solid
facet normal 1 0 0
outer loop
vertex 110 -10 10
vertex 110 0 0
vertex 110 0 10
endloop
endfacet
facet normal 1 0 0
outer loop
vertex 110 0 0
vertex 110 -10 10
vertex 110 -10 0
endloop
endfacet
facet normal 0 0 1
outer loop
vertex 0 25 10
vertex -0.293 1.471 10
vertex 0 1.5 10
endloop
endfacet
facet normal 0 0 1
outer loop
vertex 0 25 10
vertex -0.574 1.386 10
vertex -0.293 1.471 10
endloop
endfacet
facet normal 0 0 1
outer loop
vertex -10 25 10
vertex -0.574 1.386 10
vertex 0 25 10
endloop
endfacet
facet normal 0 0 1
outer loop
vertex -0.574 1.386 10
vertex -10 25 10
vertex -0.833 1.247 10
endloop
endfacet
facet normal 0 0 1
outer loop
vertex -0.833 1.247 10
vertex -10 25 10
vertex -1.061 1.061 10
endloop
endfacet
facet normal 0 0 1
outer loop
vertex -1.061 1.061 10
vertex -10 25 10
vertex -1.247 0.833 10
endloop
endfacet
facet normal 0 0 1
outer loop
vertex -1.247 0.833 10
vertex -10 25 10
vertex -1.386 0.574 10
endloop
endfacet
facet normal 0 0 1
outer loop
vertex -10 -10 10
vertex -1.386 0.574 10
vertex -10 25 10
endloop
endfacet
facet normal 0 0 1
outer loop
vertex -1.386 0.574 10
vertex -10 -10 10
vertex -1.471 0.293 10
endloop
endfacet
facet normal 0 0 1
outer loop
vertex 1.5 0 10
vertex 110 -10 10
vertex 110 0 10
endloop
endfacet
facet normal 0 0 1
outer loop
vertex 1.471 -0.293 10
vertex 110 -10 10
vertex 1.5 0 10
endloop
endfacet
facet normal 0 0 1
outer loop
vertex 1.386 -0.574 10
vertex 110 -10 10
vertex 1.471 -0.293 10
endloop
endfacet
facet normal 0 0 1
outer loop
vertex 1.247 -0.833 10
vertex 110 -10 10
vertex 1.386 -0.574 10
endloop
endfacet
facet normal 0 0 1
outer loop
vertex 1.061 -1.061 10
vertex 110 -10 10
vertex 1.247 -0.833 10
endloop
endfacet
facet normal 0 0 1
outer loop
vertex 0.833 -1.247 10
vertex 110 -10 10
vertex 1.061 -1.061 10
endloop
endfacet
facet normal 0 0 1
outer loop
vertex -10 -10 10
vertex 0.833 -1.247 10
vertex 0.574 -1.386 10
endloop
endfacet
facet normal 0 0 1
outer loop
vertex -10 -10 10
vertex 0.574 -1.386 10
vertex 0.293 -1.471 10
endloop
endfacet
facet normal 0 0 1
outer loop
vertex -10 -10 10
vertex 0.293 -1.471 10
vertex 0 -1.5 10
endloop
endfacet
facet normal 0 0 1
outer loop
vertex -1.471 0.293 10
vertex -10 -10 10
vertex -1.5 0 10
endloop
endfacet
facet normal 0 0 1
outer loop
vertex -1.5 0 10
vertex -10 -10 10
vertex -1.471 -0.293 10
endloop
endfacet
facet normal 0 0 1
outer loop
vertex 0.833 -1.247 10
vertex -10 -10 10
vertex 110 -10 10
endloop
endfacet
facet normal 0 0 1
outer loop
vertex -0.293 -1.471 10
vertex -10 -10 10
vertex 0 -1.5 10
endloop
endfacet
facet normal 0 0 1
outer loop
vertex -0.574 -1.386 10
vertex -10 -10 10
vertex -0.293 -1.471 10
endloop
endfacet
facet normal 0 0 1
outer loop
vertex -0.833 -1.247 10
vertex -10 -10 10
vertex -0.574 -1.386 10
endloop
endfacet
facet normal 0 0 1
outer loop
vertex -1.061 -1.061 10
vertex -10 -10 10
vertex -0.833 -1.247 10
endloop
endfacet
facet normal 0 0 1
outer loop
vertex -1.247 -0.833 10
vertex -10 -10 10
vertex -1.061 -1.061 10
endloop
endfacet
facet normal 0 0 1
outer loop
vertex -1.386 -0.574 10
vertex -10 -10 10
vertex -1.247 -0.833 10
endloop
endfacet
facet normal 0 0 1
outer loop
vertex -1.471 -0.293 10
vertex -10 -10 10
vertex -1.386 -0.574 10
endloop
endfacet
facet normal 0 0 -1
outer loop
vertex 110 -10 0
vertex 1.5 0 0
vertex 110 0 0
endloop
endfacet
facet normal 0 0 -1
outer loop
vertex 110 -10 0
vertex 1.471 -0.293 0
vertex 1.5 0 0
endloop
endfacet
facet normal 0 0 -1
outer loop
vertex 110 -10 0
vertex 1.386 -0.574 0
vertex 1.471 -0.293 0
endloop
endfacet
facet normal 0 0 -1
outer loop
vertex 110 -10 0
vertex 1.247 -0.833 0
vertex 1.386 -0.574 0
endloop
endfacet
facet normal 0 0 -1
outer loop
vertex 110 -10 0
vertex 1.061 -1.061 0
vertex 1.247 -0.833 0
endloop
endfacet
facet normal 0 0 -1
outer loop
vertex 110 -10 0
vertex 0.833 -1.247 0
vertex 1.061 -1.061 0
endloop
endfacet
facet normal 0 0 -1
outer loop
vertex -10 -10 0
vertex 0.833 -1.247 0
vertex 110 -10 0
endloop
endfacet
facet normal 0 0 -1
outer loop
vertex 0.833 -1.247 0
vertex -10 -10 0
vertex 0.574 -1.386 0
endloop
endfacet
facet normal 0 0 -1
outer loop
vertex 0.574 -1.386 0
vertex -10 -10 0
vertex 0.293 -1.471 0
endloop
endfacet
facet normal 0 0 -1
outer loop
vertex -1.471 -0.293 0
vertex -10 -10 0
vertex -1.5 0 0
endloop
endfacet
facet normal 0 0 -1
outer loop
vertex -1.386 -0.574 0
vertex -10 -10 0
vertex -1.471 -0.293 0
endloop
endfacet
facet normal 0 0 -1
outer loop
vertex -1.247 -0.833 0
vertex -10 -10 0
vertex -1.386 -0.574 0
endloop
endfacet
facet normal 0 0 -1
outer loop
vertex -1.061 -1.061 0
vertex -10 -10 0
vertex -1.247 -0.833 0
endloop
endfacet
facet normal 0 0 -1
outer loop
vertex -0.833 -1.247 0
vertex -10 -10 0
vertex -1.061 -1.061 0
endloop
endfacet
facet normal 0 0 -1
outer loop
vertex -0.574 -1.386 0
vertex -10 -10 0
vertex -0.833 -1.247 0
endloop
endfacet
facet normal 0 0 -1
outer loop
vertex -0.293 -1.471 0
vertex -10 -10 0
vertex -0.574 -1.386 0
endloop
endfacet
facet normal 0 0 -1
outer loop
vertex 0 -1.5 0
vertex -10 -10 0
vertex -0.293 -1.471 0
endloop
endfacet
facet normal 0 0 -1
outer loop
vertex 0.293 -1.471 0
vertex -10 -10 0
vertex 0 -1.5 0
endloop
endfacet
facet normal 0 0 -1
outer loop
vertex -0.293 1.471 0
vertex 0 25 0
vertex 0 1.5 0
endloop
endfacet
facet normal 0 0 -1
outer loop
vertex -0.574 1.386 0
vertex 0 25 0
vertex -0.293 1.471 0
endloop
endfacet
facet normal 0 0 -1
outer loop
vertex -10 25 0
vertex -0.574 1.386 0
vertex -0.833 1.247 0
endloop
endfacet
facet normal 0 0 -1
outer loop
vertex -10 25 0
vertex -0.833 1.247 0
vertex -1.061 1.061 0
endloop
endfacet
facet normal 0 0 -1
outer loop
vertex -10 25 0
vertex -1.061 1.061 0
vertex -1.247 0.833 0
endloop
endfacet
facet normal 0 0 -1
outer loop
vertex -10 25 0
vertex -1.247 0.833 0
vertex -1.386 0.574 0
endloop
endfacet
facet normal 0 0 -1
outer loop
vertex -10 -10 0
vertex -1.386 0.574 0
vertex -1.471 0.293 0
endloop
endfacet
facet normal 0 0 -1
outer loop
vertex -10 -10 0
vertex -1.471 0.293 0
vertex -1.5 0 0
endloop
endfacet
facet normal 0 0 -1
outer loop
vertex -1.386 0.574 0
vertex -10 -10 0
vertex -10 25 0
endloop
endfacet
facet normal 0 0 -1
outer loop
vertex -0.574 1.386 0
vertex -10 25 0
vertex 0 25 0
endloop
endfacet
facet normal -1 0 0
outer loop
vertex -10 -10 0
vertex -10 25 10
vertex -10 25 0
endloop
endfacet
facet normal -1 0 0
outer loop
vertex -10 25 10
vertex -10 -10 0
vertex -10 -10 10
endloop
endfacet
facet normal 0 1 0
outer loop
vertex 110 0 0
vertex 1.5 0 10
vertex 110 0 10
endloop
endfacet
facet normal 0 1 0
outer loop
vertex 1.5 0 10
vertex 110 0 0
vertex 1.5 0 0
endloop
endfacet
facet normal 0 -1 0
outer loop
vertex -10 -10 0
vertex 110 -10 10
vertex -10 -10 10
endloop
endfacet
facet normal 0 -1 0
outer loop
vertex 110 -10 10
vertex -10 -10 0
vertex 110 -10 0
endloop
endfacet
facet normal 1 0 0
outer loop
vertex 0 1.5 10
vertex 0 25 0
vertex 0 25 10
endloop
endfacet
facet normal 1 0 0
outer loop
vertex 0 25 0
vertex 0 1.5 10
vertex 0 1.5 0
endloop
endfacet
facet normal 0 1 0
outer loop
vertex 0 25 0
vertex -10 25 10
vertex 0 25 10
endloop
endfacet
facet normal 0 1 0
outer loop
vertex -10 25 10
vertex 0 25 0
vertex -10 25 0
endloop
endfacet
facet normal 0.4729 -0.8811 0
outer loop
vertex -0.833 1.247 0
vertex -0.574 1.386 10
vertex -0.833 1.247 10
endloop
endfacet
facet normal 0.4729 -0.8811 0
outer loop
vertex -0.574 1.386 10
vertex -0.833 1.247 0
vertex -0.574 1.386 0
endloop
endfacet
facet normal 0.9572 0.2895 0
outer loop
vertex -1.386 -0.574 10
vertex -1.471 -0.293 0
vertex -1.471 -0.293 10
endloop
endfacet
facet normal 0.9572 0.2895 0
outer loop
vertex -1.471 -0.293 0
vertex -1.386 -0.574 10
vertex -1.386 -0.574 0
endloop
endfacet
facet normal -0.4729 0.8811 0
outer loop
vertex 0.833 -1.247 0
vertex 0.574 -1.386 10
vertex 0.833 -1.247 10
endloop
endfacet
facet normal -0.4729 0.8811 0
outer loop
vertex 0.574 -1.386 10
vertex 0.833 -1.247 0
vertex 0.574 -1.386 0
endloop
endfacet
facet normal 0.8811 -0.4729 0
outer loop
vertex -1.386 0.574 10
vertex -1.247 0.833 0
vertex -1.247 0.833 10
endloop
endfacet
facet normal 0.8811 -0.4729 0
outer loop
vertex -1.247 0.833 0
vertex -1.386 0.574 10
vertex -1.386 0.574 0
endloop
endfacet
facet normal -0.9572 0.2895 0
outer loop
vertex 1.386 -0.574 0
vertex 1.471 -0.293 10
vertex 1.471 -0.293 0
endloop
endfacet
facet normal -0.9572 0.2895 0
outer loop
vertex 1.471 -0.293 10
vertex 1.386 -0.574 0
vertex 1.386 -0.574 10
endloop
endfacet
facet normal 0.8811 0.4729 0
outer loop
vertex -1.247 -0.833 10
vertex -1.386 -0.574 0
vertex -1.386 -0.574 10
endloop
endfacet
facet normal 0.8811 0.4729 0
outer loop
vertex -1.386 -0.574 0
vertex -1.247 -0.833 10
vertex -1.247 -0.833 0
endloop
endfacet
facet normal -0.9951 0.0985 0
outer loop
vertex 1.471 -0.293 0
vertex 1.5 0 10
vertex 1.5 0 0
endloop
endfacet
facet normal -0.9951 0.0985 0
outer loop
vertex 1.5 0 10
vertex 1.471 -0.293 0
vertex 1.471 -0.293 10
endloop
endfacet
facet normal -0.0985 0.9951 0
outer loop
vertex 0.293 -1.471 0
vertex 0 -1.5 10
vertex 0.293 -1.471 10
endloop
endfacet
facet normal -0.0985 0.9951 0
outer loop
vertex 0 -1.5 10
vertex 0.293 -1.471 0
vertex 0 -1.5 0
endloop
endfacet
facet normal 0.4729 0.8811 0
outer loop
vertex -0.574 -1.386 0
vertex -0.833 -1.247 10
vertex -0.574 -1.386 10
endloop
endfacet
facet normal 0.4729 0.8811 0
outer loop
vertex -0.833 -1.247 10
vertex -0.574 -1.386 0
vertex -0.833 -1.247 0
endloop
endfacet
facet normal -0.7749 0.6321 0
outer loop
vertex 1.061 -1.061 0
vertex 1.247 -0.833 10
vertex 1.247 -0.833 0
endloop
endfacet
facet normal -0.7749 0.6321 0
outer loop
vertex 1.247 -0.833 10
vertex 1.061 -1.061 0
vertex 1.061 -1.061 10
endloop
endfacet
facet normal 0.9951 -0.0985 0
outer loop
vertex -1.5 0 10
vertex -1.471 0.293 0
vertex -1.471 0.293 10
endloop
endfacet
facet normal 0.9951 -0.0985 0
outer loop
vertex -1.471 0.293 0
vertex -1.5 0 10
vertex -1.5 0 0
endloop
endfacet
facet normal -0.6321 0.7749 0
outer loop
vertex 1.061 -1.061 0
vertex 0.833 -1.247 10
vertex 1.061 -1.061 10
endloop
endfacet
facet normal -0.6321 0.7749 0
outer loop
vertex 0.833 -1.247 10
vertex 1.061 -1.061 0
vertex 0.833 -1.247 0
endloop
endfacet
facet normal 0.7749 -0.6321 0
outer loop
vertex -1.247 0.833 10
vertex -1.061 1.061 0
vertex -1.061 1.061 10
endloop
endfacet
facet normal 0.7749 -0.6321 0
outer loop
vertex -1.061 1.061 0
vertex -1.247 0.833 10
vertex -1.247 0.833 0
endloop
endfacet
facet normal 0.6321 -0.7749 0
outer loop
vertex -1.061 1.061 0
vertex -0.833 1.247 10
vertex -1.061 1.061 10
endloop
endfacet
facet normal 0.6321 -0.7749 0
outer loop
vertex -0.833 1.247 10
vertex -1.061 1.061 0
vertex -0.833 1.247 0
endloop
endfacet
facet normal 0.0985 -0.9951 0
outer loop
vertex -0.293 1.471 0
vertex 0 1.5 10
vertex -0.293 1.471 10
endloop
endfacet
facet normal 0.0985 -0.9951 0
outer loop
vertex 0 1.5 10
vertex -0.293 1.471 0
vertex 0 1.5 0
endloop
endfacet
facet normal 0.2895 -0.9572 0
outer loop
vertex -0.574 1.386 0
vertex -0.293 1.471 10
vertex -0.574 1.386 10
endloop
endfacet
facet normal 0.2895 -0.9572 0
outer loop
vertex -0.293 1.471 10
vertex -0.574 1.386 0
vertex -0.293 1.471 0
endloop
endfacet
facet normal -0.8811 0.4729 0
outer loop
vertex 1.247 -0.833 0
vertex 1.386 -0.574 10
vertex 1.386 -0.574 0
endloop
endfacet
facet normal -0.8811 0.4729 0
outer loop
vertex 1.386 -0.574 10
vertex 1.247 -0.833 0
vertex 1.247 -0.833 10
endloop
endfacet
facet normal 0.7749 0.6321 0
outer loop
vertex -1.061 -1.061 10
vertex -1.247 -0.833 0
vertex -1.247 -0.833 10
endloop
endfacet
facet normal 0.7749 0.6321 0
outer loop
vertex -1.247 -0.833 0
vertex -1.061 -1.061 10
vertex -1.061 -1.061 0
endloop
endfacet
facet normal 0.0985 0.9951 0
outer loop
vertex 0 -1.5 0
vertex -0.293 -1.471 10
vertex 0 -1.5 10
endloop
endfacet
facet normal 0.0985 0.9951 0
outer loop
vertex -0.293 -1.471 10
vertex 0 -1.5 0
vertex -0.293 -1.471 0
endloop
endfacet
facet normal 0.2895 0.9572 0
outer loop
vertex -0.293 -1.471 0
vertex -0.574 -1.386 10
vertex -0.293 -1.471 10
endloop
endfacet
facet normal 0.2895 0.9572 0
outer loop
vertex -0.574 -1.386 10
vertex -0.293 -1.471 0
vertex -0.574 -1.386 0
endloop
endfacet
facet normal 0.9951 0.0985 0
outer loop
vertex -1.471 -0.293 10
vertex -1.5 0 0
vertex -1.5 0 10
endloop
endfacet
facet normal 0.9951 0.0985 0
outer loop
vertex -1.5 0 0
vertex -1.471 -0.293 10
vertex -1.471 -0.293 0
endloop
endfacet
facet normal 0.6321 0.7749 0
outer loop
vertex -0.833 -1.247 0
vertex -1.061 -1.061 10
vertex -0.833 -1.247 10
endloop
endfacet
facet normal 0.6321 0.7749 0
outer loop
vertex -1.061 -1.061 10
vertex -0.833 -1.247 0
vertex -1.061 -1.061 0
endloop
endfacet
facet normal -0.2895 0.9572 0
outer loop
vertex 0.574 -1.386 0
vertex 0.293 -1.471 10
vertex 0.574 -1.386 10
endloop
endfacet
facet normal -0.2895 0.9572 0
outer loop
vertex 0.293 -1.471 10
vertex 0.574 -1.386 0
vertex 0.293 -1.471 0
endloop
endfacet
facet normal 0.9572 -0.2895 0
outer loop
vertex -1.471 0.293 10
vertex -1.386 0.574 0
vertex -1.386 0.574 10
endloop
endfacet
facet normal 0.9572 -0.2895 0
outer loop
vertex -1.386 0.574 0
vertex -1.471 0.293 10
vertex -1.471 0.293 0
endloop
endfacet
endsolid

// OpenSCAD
$fn=32;


w=10;
h=10;
d = 3;
l1=120-w;
l2=25;

difference() {
  translate([-w, -w, 0]) {
    #cube([l1+w, w, h]);
    cube([w, l2+w, h]);
  }
  translate([0, 0, -0.1]) cylinder(d=d, h=h+0.2);
}
